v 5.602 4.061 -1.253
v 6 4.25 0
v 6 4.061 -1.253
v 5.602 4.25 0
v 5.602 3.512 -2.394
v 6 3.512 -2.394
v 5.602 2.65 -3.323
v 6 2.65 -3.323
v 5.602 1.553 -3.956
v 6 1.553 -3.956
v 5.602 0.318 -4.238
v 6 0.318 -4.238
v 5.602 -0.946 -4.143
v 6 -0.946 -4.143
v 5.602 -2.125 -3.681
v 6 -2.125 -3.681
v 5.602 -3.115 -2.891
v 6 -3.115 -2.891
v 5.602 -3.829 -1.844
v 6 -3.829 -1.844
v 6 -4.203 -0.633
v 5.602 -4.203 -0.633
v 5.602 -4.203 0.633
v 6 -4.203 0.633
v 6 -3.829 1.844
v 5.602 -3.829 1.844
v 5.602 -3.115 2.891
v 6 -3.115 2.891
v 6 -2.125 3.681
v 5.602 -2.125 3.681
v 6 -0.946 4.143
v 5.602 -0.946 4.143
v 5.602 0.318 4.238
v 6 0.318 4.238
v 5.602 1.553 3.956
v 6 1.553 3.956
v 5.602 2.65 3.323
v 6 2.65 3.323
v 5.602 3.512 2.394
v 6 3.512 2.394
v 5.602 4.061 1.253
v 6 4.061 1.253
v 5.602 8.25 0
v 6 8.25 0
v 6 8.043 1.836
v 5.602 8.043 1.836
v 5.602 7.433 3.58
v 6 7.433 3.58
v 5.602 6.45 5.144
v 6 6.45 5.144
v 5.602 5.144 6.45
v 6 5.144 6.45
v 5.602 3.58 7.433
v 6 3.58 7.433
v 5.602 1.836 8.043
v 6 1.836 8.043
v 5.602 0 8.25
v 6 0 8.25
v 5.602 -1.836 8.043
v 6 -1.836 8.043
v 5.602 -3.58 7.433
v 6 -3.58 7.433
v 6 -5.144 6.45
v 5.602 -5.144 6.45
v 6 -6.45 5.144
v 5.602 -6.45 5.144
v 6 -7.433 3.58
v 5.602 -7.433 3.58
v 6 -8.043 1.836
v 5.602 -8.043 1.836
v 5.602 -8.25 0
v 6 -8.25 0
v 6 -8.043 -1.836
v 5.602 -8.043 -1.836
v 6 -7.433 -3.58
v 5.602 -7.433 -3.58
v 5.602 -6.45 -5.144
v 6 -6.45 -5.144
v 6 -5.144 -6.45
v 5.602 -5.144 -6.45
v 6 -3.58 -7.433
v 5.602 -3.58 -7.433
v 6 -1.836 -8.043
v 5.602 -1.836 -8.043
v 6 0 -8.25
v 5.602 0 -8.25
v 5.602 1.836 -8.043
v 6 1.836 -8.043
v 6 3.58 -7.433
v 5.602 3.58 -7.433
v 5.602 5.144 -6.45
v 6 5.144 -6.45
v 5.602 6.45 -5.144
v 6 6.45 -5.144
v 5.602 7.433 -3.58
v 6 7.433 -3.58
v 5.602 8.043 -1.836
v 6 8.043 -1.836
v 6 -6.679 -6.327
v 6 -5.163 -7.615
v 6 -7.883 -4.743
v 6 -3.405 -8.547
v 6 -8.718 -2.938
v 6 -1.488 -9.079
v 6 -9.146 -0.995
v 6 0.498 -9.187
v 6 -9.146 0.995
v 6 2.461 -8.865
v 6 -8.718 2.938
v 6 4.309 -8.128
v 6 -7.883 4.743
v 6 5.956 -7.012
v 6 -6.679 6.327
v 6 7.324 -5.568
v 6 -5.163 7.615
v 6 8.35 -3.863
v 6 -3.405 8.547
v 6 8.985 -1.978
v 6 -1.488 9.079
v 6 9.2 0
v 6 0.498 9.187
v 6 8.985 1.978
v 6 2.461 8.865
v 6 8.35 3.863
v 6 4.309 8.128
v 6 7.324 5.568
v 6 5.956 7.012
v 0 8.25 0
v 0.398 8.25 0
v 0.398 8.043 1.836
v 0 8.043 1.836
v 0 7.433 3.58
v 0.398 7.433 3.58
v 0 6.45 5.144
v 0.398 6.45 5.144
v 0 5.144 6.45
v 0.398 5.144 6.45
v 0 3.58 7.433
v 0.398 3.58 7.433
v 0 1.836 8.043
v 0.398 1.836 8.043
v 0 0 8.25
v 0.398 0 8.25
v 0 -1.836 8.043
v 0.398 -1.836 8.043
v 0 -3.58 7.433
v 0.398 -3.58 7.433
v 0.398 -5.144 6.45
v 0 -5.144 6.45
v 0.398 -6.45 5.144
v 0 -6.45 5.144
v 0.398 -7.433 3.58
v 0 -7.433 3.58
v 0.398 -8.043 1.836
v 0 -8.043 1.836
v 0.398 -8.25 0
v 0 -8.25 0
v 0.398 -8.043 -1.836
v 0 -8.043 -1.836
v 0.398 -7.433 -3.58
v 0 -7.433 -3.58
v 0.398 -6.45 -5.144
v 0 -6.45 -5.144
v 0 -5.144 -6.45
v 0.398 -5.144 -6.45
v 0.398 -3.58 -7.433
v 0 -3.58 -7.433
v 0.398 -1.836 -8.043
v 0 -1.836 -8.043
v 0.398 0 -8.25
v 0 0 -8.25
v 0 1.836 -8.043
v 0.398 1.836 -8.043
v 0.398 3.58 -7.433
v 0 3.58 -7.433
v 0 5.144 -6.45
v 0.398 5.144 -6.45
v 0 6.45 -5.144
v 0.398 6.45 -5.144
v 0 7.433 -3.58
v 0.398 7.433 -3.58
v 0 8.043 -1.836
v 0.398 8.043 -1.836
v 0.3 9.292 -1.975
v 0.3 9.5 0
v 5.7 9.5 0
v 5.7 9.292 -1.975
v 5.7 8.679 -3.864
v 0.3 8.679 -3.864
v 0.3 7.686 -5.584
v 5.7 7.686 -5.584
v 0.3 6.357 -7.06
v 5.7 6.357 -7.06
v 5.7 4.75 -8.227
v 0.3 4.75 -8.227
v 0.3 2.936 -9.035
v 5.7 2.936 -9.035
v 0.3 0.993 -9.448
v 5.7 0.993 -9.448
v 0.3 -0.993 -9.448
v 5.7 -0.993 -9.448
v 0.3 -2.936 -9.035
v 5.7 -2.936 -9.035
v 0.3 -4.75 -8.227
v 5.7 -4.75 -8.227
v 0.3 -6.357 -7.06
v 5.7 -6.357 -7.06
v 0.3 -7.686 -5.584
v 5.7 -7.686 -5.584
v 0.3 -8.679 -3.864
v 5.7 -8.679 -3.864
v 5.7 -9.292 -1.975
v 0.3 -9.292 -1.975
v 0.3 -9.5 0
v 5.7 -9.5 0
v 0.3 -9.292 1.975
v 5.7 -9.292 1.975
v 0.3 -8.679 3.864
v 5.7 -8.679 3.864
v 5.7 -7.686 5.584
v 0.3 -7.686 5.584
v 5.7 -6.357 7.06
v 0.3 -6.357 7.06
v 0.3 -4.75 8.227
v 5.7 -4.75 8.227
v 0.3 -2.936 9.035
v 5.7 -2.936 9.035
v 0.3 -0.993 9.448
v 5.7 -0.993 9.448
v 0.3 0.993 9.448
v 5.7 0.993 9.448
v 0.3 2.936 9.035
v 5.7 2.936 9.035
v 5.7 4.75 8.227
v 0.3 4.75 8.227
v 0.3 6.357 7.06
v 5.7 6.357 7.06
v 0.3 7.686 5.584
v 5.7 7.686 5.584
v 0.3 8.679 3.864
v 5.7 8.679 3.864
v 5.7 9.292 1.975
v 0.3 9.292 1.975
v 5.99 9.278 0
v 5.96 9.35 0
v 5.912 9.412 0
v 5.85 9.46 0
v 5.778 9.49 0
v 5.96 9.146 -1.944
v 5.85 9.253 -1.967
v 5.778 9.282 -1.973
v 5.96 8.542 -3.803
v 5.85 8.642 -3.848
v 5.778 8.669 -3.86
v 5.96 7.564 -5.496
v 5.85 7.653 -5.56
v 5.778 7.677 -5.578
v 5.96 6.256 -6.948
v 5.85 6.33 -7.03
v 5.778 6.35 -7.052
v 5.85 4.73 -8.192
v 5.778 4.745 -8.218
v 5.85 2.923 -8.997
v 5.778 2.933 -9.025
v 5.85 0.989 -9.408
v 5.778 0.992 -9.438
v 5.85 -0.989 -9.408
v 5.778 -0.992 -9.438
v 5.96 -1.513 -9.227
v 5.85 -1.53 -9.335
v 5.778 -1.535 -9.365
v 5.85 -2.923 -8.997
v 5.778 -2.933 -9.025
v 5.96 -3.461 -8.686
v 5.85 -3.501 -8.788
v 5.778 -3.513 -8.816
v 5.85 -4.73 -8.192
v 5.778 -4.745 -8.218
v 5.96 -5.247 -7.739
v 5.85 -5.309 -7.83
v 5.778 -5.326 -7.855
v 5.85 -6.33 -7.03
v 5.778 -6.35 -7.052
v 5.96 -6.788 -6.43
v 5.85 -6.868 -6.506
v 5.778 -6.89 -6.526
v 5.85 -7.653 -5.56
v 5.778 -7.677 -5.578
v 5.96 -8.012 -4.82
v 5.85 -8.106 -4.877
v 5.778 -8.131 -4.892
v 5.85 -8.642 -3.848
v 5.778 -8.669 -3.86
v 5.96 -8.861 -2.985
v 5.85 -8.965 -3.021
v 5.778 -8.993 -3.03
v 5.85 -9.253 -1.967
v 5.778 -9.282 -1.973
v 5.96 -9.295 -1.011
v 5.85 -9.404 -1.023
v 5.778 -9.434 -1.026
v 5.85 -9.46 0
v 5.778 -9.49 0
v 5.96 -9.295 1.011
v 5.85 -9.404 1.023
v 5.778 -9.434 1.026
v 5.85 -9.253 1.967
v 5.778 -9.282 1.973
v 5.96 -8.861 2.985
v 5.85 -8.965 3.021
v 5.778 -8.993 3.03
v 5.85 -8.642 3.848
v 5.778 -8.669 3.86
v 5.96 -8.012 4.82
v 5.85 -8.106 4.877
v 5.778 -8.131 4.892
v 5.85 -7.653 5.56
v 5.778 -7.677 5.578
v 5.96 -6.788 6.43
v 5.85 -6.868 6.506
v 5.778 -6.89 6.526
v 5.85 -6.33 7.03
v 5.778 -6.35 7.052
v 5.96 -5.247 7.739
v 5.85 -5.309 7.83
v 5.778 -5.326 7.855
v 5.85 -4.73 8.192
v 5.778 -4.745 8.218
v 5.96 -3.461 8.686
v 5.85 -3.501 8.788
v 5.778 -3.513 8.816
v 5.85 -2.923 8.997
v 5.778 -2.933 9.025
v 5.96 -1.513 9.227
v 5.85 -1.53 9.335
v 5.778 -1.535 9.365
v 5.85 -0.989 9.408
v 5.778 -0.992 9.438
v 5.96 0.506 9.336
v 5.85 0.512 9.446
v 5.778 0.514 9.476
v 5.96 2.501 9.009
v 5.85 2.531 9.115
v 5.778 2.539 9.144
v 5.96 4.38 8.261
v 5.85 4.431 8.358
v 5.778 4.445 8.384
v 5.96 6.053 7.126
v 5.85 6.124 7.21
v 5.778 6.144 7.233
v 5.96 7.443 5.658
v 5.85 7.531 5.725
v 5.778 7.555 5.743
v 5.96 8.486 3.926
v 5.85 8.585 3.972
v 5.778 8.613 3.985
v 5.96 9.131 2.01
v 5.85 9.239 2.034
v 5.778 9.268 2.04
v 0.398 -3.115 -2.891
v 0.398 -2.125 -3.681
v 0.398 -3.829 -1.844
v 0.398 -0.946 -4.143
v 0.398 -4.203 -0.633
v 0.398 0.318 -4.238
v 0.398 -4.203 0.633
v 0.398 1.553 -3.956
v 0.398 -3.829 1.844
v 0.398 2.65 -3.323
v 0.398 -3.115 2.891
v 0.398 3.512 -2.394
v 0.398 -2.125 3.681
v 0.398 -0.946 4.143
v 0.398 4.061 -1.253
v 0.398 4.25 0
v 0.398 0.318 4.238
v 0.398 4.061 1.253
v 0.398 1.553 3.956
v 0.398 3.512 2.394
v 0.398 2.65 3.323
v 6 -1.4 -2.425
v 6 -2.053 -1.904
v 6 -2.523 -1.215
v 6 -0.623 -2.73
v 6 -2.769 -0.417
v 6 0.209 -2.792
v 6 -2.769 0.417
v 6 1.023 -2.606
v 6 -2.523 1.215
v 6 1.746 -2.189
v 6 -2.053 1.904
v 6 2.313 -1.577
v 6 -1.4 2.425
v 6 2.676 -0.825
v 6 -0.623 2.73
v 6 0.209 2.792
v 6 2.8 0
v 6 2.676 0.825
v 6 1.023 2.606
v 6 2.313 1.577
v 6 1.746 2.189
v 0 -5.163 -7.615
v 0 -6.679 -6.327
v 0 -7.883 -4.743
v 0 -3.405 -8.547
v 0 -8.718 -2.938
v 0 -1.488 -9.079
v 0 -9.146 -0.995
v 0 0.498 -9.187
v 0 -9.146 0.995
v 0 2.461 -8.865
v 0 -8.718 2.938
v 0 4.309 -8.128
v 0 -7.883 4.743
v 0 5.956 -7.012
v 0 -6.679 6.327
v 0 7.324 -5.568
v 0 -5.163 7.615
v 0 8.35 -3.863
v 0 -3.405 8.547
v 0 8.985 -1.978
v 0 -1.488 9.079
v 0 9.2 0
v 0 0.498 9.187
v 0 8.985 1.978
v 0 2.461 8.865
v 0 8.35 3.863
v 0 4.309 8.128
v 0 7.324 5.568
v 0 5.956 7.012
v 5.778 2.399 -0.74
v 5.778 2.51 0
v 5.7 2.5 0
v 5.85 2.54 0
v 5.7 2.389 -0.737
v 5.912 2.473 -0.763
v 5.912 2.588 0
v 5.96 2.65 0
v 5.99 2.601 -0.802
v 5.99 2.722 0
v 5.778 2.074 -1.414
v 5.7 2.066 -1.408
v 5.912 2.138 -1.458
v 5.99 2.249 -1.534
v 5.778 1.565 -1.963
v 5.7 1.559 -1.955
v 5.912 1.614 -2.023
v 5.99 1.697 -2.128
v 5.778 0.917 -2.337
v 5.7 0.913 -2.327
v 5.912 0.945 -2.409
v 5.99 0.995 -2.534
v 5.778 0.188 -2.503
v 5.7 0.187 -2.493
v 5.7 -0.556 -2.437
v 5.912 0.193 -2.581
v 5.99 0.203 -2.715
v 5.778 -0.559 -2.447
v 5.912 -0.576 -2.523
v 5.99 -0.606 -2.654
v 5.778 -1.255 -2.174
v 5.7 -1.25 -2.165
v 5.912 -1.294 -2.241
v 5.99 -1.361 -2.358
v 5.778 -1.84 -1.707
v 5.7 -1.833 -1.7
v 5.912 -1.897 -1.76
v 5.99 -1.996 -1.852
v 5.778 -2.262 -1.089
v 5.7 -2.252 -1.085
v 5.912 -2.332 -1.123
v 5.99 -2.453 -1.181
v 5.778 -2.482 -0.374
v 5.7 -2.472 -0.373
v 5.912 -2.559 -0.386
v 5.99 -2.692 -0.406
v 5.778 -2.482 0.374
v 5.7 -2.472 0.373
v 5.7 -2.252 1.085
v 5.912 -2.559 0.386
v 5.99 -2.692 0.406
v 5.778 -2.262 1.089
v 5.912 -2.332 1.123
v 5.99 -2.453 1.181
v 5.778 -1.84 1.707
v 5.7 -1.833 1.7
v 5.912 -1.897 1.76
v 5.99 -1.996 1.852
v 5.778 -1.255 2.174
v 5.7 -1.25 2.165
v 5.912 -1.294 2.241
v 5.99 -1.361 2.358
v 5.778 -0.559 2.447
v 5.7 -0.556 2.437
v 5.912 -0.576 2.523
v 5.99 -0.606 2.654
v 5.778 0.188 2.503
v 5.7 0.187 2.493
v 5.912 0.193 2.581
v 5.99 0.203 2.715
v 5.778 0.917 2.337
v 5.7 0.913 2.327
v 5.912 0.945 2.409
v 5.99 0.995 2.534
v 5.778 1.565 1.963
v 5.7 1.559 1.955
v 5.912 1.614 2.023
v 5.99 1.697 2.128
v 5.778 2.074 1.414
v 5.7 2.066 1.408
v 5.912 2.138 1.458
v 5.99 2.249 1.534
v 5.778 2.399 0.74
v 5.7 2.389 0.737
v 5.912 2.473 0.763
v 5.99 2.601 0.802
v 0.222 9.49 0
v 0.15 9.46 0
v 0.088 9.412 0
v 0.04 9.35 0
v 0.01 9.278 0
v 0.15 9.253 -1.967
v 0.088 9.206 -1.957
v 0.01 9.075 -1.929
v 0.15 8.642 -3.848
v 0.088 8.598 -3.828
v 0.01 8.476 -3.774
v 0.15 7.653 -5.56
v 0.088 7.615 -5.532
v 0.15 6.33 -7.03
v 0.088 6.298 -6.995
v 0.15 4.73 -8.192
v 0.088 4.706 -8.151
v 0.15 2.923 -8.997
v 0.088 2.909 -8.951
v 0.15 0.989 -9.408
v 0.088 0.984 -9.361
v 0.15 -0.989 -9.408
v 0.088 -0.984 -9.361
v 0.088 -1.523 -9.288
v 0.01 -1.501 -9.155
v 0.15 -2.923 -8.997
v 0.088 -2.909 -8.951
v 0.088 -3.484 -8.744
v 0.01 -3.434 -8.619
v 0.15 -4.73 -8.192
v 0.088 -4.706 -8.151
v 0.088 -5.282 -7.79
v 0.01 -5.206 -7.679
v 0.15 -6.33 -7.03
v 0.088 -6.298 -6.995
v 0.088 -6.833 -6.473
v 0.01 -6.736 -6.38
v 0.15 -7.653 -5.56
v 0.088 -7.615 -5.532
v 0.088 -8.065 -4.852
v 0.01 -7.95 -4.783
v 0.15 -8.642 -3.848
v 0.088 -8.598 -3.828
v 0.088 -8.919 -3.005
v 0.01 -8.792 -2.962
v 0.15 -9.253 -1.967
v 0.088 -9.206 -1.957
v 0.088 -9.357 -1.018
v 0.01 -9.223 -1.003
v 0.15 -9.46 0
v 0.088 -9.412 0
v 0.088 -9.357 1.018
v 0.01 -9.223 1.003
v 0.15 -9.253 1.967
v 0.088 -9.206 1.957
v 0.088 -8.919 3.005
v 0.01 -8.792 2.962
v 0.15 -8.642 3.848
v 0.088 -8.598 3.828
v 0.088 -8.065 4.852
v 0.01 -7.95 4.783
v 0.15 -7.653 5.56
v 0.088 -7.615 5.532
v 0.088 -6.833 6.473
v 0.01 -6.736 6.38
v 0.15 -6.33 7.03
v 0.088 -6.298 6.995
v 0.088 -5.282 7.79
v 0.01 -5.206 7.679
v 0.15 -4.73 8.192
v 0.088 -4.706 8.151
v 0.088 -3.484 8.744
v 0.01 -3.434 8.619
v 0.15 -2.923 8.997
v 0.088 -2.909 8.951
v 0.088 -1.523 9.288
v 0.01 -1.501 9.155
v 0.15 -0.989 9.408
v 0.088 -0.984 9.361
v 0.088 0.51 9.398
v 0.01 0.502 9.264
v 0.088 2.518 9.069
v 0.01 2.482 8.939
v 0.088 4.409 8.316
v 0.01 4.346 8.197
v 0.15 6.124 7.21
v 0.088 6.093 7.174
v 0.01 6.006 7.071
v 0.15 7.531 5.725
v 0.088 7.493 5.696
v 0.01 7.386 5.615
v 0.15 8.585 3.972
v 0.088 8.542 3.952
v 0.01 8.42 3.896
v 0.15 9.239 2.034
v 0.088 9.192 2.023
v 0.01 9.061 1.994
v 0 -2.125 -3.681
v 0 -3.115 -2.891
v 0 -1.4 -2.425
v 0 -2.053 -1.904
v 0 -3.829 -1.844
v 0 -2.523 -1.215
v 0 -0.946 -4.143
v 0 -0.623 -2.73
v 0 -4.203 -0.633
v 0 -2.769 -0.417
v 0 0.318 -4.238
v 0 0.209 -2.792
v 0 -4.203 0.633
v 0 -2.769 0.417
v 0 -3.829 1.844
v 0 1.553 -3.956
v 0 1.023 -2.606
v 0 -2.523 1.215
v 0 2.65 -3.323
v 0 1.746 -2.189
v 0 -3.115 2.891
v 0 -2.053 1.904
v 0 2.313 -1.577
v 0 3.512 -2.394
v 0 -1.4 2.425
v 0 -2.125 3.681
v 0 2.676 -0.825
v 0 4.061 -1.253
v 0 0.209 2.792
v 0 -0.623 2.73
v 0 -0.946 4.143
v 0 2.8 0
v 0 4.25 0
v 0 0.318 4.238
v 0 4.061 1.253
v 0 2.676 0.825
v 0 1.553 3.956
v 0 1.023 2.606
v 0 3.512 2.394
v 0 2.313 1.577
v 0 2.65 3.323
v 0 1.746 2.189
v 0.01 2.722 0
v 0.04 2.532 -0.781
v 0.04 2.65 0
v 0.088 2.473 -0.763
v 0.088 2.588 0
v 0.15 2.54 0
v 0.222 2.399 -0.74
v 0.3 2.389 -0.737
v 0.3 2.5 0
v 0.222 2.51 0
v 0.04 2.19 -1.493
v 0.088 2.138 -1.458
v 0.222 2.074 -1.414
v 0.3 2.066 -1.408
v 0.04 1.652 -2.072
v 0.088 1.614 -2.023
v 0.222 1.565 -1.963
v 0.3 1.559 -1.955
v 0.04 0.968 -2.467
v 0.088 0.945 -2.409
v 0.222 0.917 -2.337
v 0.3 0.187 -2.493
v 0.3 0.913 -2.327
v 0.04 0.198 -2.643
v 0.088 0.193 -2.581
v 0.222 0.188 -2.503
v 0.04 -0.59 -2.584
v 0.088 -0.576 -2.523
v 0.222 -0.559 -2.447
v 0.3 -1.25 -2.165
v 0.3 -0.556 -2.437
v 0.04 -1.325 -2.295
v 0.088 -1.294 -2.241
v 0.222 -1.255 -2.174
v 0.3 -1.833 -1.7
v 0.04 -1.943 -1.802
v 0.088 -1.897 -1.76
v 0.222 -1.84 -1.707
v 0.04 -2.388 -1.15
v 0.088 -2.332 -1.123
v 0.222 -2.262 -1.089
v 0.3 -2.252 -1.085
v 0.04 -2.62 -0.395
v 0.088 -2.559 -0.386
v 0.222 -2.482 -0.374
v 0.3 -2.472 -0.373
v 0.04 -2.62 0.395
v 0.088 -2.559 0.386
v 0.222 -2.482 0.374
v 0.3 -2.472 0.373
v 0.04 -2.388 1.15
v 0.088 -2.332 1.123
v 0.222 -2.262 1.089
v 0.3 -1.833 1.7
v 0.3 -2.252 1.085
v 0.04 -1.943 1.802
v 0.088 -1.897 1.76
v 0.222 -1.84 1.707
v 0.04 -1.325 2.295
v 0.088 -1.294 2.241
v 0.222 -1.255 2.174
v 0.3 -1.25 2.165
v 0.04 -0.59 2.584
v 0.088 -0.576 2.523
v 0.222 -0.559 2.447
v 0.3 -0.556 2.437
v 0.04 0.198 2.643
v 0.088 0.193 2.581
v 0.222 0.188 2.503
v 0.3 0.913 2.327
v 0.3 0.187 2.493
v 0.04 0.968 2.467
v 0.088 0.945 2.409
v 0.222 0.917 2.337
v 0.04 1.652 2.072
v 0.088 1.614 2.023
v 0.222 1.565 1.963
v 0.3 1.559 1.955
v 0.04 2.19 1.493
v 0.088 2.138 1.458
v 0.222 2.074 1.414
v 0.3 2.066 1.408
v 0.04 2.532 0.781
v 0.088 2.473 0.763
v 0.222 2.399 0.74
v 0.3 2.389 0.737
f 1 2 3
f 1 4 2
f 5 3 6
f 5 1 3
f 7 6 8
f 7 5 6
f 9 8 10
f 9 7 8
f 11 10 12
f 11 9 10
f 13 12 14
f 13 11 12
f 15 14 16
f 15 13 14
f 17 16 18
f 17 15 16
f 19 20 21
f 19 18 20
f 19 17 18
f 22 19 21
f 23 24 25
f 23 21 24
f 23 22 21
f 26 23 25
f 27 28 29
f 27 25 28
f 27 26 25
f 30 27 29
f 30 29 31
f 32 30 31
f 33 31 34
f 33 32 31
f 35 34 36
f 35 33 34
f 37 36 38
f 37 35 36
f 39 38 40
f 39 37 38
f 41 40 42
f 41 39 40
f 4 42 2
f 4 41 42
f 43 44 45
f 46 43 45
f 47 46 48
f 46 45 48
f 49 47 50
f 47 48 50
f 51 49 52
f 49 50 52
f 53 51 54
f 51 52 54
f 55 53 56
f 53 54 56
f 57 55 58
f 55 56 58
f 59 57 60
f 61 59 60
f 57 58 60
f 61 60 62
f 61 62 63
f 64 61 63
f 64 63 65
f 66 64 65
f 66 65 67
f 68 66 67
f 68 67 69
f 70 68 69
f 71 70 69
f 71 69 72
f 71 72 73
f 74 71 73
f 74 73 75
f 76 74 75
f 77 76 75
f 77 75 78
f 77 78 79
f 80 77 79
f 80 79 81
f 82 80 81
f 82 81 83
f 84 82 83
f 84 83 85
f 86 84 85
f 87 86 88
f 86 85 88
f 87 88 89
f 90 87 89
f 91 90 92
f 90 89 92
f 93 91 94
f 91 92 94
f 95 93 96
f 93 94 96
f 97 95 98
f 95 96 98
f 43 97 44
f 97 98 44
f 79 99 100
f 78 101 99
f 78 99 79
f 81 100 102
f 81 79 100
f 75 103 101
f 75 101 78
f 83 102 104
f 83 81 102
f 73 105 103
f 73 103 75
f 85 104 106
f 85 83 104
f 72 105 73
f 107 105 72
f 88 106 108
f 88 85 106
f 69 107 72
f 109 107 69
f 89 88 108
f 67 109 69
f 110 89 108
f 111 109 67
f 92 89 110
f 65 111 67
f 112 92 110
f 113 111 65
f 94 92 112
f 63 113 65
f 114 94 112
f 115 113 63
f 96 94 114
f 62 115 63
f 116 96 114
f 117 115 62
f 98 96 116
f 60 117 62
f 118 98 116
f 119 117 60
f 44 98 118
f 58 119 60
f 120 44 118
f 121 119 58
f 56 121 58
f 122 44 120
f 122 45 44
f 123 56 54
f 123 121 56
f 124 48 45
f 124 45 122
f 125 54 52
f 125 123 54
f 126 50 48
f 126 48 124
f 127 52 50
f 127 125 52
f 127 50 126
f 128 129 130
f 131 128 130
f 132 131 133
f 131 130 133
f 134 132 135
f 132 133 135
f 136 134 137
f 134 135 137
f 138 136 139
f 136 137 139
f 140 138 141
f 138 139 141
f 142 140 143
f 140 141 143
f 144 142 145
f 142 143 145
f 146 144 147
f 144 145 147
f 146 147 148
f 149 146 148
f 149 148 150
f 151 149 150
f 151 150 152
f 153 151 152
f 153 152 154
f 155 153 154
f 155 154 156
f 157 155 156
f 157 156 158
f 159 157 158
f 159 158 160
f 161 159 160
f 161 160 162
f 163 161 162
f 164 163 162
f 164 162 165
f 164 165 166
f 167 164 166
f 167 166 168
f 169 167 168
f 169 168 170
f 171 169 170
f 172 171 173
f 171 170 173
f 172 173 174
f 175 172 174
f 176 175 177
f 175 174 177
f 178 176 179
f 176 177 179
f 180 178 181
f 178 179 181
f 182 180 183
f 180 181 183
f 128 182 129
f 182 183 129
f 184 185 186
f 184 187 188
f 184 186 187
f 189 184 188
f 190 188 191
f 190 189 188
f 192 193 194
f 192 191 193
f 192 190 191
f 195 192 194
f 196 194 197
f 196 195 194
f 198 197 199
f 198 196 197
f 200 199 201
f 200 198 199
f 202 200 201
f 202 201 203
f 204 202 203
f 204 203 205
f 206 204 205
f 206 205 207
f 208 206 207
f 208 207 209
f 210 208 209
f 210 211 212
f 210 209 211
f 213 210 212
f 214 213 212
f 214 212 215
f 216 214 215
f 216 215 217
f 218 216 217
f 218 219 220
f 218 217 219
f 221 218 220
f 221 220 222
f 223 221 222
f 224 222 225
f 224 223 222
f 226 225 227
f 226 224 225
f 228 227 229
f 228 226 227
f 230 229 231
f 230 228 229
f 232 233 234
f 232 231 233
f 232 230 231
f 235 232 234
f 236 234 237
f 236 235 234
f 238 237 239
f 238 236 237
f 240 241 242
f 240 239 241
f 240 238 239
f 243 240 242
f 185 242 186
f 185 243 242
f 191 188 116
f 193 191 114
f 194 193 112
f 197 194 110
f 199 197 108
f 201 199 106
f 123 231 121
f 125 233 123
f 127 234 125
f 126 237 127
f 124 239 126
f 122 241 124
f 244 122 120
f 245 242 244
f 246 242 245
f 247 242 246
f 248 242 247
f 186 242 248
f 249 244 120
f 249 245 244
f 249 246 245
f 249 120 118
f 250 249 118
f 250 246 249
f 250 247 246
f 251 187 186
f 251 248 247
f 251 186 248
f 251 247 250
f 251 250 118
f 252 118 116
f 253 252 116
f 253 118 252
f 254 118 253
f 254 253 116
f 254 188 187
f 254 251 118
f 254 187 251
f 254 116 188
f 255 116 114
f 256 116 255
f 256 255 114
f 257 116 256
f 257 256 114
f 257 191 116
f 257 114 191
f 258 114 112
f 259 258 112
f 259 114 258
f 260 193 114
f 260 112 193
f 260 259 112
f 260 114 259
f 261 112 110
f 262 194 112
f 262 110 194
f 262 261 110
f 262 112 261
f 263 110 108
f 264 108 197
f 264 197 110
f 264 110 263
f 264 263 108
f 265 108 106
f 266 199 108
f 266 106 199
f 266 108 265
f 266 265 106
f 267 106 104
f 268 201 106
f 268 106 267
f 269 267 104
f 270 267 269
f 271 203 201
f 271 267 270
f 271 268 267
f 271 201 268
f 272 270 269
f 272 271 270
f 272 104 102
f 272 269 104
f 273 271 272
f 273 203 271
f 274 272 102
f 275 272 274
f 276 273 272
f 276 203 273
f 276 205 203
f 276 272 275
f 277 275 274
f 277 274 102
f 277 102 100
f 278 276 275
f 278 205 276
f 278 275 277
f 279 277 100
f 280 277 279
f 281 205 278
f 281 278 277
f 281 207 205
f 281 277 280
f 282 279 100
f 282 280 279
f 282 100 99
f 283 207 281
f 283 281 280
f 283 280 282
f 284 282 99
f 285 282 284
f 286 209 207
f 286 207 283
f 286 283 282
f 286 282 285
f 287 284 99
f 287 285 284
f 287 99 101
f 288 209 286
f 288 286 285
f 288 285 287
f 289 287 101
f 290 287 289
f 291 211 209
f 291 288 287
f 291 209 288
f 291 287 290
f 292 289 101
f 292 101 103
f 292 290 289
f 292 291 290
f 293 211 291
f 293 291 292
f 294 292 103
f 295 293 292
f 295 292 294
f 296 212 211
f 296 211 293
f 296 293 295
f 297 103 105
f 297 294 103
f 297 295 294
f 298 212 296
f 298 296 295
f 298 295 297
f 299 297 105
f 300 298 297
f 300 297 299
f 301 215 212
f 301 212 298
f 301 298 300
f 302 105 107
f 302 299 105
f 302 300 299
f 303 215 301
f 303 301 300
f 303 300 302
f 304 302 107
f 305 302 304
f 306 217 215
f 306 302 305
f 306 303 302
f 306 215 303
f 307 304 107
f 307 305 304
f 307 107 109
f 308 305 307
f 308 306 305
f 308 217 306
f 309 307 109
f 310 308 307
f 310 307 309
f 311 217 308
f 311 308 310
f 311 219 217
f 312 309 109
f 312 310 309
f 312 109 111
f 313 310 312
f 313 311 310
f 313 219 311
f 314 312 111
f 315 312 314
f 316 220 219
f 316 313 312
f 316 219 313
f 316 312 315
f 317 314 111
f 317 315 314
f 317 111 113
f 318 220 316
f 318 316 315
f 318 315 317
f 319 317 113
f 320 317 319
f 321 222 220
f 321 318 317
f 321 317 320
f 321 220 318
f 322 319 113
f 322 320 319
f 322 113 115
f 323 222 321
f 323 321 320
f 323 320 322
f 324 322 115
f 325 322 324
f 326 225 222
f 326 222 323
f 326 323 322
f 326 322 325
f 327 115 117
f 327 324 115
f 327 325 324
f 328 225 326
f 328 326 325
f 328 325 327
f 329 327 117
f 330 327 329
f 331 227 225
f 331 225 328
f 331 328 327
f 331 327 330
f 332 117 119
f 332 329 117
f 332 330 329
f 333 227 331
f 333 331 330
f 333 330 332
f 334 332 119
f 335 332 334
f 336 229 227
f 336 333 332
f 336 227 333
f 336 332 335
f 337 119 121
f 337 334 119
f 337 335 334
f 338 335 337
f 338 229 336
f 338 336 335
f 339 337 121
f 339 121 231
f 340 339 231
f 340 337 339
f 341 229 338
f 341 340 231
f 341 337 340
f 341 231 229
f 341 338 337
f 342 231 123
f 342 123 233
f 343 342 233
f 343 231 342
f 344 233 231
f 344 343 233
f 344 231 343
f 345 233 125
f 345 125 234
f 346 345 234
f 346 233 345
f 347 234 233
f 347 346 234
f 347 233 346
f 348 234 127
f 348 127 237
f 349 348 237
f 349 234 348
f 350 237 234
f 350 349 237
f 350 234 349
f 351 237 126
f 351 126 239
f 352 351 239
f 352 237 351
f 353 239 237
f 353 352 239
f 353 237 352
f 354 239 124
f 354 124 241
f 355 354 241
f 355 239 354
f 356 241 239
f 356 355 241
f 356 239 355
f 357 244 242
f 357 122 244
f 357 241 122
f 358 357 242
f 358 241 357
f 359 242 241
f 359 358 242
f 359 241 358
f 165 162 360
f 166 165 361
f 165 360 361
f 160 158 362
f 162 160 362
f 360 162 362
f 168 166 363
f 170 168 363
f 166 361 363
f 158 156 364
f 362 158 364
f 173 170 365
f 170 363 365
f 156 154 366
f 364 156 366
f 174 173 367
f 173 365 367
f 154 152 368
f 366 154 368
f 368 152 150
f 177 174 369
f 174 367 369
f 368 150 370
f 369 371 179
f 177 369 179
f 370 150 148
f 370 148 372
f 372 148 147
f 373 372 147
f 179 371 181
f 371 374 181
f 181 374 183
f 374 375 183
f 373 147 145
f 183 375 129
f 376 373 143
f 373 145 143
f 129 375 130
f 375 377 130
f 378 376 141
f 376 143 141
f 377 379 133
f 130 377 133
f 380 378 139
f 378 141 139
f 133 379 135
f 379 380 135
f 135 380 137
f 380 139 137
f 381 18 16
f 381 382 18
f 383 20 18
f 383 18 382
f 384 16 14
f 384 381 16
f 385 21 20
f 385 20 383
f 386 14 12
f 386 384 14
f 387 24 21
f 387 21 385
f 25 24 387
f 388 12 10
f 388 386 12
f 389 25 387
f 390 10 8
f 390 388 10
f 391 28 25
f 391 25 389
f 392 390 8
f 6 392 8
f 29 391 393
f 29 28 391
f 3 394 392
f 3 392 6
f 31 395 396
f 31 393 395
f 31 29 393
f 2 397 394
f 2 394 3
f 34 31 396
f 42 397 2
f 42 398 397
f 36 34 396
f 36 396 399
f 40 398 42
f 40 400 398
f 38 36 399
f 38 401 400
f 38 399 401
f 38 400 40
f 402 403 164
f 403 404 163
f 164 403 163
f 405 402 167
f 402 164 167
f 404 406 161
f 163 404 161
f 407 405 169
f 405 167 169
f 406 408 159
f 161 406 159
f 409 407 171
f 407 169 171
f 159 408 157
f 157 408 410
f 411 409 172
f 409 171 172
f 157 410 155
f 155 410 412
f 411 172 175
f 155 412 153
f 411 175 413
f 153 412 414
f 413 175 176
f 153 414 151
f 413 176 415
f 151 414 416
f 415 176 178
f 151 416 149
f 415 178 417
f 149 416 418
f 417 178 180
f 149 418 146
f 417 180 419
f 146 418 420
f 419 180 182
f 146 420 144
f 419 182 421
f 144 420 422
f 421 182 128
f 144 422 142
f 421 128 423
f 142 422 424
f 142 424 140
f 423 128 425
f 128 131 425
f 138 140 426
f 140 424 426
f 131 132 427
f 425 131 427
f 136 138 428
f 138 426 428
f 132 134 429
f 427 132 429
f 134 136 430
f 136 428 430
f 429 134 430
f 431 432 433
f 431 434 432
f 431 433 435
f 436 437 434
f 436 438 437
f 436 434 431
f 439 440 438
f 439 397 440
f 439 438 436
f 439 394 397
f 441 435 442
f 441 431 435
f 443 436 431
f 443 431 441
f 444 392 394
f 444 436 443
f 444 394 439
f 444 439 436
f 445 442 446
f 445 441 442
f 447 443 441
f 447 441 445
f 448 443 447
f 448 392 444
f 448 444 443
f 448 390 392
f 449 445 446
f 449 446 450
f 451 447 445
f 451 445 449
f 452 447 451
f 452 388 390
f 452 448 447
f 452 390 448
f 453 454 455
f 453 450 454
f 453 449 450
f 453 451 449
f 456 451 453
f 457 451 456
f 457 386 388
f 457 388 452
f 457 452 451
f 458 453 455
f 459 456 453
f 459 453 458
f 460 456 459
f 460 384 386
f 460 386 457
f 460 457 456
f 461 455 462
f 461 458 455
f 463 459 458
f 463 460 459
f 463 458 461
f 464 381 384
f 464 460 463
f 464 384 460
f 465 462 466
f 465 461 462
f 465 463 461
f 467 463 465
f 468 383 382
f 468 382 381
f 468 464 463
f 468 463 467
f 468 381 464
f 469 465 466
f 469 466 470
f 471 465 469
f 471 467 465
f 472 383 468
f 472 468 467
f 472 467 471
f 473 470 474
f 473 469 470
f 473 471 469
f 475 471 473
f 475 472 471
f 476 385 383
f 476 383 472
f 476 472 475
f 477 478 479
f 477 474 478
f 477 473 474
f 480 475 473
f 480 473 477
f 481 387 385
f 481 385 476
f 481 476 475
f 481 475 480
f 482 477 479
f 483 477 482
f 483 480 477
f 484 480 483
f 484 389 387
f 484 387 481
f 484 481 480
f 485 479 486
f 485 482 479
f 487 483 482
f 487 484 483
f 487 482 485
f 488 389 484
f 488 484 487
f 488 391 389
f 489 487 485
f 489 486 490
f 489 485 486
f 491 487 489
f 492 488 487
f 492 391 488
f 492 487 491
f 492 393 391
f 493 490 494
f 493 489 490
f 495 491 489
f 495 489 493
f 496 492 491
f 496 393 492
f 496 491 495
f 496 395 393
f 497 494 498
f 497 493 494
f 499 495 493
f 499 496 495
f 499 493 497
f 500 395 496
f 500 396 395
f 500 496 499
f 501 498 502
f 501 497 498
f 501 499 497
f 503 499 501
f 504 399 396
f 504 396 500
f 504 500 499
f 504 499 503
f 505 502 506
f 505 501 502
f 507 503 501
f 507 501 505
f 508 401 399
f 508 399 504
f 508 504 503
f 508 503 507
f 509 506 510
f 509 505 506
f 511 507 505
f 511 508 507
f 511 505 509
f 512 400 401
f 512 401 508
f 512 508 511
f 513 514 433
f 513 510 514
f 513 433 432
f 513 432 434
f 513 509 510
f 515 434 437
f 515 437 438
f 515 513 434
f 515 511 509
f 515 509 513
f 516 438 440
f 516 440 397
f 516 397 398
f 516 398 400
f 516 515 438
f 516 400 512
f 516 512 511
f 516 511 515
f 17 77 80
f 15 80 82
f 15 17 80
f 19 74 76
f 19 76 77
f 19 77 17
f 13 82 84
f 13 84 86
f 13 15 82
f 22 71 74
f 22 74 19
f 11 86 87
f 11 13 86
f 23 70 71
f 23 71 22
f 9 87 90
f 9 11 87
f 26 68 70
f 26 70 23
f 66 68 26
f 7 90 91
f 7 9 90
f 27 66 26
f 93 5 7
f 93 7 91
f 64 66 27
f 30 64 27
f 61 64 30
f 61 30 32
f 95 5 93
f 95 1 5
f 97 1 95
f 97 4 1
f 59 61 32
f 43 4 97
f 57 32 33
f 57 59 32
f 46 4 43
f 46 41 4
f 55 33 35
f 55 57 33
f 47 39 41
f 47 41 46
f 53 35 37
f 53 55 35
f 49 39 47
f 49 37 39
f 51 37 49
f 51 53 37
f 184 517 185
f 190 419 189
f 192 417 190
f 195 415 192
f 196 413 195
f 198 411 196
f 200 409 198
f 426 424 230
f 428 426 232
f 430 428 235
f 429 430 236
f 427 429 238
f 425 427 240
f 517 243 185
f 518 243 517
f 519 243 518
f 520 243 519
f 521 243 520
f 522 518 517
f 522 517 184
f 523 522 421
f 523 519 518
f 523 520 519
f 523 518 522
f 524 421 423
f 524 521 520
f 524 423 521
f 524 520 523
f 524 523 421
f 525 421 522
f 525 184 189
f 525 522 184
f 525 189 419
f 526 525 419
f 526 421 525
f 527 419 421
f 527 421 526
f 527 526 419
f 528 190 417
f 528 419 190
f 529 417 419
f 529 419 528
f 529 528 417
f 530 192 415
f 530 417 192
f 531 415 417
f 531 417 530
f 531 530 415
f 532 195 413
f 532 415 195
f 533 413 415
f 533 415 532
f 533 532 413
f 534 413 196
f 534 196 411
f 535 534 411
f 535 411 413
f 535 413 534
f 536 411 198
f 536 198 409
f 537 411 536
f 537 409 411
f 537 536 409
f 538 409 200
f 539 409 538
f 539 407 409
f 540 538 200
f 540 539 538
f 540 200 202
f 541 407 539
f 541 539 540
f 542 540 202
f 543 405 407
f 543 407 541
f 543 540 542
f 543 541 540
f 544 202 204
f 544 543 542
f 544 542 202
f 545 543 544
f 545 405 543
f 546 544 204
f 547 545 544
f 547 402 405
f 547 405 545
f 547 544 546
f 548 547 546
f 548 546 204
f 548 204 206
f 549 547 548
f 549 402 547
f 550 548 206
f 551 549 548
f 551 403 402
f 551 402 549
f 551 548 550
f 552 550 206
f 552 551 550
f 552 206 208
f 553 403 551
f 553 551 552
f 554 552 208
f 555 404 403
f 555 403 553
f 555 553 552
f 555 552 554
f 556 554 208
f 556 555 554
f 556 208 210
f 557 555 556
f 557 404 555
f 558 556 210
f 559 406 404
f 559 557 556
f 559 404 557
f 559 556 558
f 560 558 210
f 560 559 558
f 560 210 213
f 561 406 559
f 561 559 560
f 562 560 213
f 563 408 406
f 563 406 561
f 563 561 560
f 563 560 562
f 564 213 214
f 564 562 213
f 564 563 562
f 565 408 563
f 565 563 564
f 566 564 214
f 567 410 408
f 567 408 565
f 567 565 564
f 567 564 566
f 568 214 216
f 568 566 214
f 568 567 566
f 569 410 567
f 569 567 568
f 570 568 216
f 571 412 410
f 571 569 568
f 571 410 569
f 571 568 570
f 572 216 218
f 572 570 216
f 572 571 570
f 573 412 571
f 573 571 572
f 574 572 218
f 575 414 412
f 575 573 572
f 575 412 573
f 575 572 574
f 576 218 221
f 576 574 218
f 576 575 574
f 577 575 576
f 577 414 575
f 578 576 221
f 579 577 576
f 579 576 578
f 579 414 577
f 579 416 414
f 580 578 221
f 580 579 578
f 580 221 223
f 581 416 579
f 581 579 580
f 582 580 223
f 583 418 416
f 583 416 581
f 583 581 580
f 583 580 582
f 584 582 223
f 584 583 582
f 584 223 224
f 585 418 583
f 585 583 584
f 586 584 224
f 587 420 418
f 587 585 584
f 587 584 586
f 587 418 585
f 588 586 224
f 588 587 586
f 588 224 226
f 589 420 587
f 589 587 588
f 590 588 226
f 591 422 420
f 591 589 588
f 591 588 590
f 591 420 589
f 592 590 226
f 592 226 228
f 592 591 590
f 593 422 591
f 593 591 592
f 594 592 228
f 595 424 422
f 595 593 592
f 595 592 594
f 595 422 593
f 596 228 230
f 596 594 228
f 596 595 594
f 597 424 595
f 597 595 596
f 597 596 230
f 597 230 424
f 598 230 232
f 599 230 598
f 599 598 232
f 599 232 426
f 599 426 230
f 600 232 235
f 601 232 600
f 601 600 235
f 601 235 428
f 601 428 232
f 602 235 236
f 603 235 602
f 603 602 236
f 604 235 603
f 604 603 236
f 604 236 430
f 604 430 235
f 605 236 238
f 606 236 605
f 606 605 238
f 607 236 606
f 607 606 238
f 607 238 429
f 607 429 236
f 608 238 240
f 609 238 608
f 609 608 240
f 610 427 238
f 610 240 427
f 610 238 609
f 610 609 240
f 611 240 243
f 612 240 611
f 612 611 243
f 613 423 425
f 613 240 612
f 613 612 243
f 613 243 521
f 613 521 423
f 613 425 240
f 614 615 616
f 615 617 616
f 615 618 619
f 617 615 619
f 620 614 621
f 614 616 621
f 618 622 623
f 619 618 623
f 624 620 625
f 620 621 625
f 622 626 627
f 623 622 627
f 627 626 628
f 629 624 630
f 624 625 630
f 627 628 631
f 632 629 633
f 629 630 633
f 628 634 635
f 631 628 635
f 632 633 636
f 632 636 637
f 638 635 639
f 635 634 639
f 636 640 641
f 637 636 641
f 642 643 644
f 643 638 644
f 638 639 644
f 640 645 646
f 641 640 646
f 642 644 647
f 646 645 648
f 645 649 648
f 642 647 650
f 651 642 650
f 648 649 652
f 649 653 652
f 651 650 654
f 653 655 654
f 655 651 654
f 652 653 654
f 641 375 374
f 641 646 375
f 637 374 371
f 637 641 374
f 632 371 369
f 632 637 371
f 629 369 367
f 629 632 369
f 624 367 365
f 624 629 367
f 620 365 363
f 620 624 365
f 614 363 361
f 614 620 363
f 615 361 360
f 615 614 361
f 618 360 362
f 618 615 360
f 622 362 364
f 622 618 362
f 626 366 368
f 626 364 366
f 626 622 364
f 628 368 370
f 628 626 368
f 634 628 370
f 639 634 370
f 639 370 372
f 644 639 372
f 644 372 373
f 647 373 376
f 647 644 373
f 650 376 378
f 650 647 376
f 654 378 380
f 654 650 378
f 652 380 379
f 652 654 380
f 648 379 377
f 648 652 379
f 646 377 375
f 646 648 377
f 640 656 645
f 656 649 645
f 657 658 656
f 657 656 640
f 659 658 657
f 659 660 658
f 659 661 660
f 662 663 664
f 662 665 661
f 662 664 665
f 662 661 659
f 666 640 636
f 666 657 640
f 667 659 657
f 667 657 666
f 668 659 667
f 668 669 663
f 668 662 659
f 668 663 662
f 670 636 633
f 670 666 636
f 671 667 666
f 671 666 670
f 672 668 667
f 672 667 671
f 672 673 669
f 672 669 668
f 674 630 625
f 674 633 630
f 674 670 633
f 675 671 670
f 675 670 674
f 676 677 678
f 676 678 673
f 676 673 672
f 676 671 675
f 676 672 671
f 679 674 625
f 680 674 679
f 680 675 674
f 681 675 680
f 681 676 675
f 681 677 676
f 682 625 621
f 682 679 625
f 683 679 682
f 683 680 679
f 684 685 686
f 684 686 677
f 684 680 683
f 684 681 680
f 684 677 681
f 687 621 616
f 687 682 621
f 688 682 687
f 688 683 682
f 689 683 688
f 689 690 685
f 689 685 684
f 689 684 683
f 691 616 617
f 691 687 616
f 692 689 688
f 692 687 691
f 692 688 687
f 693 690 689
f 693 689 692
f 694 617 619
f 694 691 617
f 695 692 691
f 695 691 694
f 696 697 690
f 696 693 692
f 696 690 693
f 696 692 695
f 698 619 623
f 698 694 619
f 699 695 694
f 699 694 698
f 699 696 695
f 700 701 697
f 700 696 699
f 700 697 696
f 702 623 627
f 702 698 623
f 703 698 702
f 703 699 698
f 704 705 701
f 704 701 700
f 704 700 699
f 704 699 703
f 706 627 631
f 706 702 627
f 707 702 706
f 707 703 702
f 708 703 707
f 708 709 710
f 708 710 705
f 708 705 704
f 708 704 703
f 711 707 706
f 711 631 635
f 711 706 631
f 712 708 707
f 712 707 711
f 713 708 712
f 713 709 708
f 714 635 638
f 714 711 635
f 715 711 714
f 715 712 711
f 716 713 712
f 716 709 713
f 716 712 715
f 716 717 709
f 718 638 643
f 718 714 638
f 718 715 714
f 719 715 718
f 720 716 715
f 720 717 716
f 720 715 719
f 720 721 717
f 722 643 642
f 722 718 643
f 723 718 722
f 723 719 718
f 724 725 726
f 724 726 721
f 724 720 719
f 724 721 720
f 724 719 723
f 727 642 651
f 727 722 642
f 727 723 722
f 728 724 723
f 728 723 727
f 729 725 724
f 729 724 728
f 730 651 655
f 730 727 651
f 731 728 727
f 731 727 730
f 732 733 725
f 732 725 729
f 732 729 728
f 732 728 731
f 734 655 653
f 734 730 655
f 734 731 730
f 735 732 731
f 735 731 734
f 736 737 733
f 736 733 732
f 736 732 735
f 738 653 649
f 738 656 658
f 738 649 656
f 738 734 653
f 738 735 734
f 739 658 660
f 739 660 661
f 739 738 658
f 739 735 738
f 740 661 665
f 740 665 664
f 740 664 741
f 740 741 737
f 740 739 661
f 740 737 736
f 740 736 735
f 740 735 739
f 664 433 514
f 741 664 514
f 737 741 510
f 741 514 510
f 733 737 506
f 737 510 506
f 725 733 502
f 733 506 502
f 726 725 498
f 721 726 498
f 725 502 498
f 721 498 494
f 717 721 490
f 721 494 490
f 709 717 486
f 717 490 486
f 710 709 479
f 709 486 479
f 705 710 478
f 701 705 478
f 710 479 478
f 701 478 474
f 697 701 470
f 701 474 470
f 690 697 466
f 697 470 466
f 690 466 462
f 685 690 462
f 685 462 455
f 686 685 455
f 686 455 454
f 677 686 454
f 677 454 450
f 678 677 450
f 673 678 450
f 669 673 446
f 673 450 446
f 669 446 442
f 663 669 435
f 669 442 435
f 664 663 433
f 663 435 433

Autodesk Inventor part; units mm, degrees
sketch "Sketch_1" plane through (0, 0, 0) normal (0, 0, 1) x (1, 0, 0)
  line L0 (5.7, 0) -> (0.3, 0)
  arc A0 (0, 2.8) -> (0.3, 2.5) centre (0.3, 2.8) ccw
  line L1 (0.3, 2.5) -> (5.7, 2.5)
  arc A1 (5.7, 2.5) -> (6, 2.8) centre (5.7, 2.8) ccw
  line L2 (6, 2.8) -> (6, 4.25)
  line L3 (6, 4.25) -> (5.6016, 4.25)
  line L4 (5.6016, 4.25) -> (5.6016, 8.25)
  line L5 (5.6016, 8.25) -> (6, 8.25)
  line L6 (6, 8.25) -> (6, 9.2)
  arc A2 (6, 9.2) -> (5.7, 9.5) centre (5.7, 9.2) ccw
  line L7 (5.7, 9.5) -> (0.3, 9.5)
  arc A3 (0.3, 9.5) -> (0, 9.2) centre (0.3, 9.2) ccw
  line L8 (0, 9.2) -> (0, 8.25)
  line L9 (0, 8.25) -> (0.3984, 8.25)
  line L10 (0.3984, 8.25) -> (0.3984, 4.25)
  line L11 (0.3984, 4.25) -> (0, 4.25)
  line L12 (0, 4.25) -> (0, 2.8)
revolve "Revolution1" add sketch "Sketch_1" angle 360 about axis through (5.7, 0, 0) along (1, 0, 0)
ref_plane "to_housing_XY" through (0, 0, 0) normal (1, 0, 0) x (0, 0, -1)
ref_plane "to_housing_YZ" through (0, 0, 0) normal (0, 0, -1) x (0, 1, 0)
ref_plane "to_housing_ZX" through (0, 0, 0) normal (0, 1, 0) x (1, 0, 0)
ref_plane "to_housing_center_XY" through (3, 0, 0) normal (1, 0, 0) x (0, 0, -1)
ref_plane "to_housing_center_YZ" through (3, 0, 0) normal (0, 0, -1) x (0, 1, 0)
ref_plane "to_housing_center_ZX" through (3, 0, 0) normal (0, 1, 0) x (1, 0, 0)
ref_plane "作業平面7" through (3, 0, 0) normal (1, 0, 0) x (0, 0, -1)
properties part number "C-SE635ZZ"
